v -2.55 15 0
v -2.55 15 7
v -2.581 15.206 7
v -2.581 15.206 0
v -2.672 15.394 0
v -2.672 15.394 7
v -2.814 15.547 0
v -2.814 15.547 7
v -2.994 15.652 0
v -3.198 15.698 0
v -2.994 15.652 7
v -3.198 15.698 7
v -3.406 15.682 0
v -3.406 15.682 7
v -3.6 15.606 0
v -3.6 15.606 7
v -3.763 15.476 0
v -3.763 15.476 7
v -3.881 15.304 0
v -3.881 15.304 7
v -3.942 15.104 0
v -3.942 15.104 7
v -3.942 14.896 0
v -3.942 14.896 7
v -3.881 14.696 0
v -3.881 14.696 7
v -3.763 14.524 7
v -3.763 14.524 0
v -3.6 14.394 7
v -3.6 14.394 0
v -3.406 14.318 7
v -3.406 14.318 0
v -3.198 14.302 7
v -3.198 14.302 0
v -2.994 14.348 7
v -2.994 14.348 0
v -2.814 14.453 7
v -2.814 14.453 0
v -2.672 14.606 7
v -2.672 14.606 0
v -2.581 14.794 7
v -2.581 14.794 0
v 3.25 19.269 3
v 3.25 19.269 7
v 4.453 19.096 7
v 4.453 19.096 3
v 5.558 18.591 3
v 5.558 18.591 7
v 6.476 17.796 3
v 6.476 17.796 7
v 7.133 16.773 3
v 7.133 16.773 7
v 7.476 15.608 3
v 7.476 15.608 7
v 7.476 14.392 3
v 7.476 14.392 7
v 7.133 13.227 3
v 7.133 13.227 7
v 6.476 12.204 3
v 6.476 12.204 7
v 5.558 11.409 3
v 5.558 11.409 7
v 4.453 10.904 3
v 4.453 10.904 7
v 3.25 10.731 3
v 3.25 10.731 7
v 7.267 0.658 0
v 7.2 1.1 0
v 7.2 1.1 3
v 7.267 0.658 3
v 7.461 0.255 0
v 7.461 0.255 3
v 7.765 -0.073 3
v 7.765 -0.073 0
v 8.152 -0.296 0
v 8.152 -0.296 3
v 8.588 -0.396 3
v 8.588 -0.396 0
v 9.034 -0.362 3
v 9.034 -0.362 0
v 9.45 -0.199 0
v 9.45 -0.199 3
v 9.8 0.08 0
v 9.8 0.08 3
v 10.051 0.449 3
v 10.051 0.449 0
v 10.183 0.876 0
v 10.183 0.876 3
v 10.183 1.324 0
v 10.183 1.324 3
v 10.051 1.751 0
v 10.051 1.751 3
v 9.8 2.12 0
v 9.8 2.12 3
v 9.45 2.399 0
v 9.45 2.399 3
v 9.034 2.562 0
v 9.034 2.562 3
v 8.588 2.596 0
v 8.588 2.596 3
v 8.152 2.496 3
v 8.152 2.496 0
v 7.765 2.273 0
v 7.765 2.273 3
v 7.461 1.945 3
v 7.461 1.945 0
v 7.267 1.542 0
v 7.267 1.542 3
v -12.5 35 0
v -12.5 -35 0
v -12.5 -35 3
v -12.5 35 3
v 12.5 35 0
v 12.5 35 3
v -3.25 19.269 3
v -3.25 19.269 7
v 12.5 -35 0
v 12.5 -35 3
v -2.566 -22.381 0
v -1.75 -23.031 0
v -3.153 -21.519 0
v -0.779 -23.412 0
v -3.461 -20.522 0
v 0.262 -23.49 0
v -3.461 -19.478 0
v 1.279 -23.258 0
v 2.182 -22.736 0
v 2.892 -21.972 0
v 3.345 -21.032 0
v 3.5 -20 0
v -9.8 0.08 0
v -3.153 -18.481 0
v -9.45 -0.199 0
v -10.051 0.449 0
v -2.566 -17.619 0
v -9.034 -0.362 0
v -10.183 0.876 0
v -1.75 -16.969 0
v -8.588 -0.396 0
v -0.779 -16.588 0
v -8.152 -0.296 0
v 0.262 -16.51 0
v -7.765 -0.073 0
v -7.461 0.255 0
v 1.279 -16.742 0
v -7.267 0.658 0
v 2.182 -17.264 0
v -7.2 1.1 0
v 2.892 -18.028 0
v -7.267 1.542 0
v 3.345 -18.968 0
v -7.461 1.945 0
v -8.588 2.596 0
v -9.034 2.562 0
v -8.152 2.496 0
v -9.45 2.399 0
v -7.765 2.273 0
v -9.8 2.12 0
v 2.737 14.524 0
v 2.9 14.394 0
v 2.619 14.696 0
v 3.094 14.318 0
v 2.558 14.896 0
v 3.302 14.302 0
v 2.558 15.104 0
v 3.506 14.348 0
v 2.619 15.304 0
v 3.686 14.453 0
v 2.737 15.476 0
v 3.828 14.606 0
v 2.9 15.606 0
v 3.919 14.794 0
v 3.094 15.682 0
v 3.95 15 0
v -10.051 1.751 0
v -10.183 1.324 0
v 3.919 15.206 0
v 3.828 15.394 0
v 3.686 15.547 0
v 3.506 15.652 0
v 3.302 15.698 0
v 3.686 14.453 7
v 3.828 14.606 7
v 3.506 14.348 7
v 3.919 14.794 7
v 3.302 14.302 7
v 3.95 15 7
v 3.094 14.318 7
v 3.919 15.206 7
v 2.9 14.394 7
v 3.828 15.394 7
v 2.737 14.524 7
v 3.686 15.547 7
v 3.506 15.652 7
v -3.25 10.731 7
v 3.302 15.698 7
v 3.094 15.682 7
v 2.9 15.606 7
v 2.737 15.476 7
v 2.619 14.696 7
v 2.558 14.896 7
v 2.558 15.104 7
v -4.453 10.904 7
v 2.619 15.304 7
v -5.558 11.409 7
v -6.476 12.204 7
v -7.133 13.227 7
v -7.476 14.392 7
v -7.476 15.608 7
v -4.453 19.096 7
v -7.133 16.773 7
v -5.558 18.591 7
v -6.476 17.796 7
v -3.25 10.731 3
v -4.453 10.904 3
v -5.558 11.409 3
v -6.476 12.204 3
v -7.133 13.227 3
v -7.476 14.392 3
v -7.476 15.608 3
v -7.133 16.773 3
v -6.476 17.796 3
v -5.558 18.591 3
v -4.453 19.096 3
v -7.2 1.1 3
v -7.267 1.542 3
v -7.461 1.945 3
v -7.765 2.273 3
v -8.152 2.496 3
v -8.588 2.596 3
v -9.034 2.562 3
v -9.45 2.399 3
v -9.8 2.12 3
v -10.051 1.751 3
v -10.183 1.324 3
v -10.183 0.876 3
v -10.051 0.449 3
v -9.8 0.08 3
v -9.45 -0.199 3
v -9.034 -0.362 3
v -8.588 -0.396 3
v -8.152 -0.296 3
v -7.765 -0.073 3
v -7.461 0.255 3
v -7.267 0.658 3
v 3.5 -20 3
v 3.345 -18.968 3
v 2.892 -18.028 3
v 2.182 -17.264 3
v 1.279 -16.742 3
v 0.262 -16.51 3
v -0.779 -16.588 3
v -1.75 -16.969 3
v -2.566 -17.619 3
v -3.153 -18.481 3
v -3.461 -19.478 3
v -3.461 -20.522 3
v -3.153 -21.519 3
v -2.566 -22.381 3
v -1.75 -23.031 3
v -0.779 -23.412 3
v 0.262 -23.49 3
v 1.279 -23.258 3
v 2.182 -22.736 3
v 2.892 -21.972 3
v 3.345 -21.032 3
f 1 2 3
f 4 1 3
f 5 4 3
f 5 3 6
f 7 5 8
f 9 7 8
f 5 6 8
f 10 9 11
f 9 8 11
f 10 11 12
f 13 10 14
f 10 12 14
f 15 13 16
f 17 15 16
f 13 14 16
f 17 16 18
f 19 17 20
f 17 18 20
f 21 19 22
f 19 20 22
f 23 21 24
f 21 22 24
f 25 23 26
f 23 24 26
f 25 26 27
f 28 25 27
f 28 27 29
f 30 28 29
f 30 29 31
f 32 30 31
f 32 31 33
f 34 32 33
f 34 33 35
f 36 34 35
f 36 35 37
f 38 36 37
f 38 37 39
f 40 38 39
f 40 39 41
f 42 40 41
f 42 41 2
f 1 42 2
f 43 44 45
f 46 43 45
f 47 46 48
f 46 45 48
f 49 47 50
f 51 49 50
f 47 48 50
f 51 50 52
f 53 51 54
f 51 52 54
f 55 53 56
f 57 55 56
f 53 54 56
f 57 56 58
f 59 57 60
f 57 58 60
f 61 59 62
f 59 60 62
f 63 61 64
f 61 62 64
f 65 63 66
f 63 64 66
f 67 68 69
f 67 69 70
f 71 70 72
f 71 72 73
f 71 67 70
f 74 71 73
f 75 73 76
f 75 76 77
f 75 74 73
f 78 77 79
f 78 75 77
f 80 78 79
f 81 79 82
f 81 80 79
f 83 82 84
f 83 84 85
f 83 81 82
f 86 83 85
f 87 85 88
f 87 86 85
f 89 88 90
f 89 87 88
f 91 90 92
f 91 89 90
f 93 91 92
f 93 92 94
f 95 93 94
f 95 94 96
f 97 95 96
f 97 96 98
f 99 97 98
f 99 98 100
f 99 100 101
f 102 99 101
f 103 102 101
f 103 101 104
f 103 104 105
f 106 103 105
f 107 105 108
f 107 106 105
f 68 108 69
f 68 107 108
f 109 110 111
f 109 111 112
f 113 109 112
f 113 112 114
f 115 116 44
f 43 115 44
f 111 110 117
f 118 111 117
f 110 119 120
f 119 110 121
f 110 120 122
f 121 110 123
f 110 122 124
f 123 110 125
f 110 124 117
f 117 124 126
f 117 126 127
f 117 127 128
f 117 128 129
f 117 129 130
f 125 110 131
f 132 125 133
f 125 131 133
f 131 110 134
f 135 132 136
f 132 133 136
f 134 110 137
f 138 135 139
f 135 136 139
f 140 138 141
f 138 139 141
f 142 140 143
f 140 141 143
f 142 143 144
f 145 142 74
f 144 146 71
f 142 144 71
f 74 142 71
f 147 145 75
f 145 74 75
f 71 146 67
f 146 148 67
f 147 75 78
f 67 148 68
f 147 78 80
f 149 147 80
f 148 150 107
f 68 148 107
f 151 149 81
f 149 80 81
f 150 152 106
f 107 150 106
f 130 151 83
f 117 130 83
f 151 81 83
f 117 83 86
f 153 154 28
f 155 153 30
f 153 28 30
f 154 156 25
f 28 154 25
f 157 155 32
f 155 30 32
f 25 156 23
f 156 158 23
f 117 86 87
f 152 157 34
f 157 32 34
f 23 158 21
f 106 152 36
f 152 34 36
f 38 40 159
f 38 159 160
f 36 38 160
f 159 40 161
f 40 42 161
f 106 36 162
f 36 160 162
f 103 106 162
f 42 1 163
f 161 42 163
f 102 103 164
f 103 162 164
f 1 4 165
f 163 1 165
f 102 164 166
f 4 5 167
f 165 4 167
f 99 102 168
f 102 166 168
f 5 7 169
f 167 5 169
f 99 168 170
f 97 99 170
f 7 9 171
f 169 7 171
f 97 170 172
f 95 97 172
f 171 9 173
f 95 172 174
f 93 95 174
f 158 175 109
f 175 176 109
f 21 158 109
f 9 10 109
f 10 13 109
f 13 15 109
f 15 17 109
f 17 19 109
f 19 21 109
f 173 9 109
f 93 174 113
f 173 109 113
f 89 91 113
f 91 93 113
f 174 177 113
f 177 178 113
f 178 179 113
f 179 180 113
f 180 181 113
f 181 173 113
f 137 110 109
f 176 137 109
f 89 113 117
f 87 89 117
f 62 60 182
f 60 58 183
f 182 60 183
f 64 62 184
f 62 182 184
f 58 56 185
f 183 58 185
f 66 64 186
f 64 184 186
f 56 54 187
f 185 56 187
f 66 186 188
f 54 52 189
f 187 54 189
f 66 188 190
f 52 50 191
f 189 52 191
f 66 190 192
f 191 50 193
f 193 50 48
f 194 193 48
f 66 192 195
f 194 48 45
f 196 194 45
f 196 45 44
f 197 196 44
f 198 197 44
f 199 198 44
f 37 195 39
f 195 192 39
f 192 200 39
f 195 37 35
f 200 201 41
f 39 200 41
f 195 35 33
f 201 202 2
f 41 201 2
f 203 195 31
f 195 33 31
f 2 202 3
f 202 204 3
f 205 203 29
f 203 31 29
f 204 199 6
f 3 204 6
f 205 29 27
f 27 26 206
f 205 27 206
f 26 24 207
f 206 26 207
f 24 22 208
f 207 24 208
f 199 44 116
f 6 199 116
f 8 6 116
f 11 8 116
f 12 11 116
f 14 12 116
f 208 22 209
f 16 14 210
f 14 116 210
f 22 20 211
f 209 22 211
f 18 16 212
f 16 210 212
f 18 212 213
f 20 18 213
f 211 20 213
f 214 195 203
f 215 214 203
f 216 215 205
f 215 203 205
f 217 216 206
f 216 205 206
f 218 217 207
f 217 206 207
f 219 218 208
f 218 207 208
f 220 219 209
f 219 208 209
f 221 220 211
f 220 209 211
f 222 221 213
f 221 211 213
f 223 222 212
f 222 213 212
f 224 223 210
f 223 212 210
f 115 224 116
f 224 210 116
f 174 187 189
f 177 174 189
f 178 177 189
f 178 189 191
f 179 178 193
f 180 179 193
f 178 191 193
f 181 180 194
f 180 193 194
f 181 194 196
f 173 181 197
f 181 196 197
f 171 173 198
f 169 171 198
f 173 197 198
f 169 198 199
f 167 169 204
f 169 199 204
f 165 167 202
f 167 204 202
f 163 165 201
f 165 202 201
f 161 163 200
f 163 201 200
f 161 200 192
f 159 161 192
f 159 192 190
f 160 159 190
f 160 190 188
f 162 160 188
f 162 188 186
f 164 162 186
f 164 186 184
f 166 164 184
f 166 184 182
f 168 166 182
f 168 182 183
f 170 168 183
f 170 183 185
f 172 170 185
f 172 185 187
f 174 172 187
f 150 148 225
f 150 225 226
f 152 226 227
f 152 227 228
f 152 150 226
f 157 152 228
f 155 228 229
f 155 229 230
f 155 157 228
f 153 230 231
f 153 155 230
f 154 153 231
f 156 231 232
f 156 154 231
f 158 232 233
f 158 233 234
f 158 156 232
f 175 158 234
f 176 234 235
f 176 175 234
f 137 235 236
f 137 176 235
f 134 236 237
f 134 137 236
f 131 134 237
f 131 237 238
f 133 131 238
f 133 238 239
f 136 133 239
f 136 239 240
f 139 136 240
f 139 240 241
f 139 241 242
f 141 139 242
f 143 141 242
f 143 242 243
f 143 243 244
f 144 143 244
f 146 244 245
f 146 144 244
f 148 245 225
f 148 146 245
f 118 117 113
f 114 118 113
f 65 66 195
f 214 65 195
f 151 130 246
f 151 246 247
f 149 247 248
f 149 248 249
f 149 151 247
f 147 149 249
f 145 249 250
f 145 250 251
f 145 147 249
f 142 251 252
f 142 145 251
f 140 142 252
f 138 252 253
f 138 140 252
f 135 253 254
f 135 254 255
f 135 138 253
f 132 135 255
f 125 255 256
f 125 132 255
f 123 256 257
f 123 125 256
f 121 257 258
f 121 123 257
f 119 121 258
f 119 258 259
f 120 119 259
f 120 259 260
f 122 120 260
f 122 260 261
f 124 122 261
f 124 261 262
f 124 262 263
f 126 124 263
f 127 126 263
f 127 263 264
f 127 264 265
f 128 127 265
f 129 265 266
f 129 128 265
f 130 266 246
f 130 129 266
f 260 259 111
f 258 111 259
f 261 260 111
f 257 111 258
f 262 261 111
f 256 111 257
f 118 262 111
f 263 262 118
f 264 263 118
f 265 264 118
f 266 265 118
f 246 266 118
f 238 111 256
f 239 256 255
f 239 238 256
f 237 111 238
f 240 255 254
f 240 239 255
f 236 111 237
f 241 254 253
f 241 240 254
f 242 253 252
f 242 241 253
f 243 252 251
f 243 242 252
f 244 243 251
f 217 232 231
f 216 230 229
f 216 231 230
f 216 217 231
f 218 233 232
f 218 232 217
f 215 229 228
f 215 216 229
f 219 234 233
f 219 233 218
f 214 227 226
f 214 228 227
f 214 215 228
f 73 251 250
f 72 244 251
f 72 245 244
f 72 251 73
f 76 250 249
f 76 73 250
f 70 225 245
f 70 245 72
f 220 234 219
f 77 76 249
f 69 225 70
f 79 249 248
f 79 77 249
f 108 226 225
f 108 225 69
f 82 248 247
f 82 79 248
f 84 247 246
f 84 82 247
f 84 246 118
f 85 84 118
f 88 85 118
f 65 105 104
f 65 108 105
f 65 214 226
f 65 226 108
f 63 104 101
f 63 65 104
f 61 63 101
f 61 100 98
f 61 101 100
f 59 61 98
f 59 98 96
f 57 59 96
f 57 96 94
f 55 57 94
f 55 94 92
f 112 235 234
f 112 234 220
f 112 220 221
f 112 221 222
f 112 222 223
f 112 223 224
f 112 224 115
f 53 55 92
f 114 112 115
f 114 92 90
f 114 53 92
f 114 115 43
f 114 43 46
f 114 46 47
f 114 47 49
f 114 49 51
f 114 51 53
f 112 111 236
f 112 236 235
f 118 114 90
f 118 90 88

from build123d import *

# Parameters (mm, degrees)
SKETCH1_W           = 25
SKETCH1_H           = 70
SKETCH1_R           = 1.5
SKETCH1_R_2         = 3.5
BOSS_EXTRUDE1_DEPTH = 3
CUT_EXTRUDE1_REACH  = 39.286
SKETCH3_R           = 0.7
BOSS_EXTRUDE2_START = 4
SKETCH4_R           = 0.7
BOSS_EXTRUDE2_DEPTH = 4


with BuildPart() as part:
    # Sketch1 → Boss-Extrude1 (new body)
    with BuildSketch(Plane.XY):
        Rectangle(SKETCH1_W, SKETCH1_H)
        with Locations((-8.7, 1.1)):
            Circle(SKETCH1_R, mode=Mode.SUBTRACT)
        with Locations((0, -20)):
            Circle(SKETCH1_R_2, mode=Mode.SUBTRACT)
        with Locations(Location((8.7, 1.1, 0), (0, 0, 180))):
            Circle(SKETCH1_R, mode=Mode.SUBTRACT)
    extrude(amount=BOSS_EXTRUDE1_DEPTH)

    # Sketch3 → Cut-Extrude1 (cut, up to next)
    with BuildSketch(Plane.XY.offset(3), mode=Mode.PRIVATE) as cut_extrude1_sk1:
        with Locations((-3.25, 15)):
            Circle(SKETCH3_R)
    cut_extrude1_tool1 = extrude(cut_extrude1_sk1.sketch, amount=-CUT_EXTRUDE1_REACH, mode=Mode.PRIVATE) & part.part
    # Sketch3 → Cut-Extrude1 (cut, up to next)
    with BuildSketch(Plane.XY.offset(3), mode=Mode.PRIVATE) as cut_extrude1_sk2:
        with Locations((3.25, 15)):
            Circle(SKETCH3_R)
    cut_extrude1_tool2 = extrude(cut_extrude1_sk2.sketch, amount=-CUT_EXTRUDE1_REACH, mode=Mode.PRIVATE) & part.part
    add(cut_extrude1_tool1.solids().sort_by_distance((-3.25, 15, 3))[0], mode=Mode.SUBTRACT)
    add(cut_extrude1_tool2.solids().sort_by_distance((3.25, 15, 3))[0], mode=Mode.SUBTRACT)

    # Sketch4 → Boss-Extrude2 (add)
    with BuildSketch(Plane.XY.offset(3).offset(BOSS_EXTRUDE2_START)):
        with BuildLine():
            Line((-3.25, 19.269172648), (3.25, 19.269172648))
            ThreePointArc((3.25, 19.269172648), (7.519172648, 15), (3.25, 10.730827352))
            Line((3.25, 10.730827352), (-3.25, 10.730827352))
            ThreePointArc((-3.25, 10.730827352), (-7.519172648, 15), (-3.25, 19.269172648))
        make_face()
        with Locations((-3.25, 15)):
            Circle(SKETCH4_R, mode=Mode.SUBTRACT)
        with Locations((3.25, 15)):
            Circle(SKETCH4_R, mode=Mode.SUBTRACT)
    extrude(amount=-BOSS_EXTRUDE2_DEPTH)


solid = part.part
